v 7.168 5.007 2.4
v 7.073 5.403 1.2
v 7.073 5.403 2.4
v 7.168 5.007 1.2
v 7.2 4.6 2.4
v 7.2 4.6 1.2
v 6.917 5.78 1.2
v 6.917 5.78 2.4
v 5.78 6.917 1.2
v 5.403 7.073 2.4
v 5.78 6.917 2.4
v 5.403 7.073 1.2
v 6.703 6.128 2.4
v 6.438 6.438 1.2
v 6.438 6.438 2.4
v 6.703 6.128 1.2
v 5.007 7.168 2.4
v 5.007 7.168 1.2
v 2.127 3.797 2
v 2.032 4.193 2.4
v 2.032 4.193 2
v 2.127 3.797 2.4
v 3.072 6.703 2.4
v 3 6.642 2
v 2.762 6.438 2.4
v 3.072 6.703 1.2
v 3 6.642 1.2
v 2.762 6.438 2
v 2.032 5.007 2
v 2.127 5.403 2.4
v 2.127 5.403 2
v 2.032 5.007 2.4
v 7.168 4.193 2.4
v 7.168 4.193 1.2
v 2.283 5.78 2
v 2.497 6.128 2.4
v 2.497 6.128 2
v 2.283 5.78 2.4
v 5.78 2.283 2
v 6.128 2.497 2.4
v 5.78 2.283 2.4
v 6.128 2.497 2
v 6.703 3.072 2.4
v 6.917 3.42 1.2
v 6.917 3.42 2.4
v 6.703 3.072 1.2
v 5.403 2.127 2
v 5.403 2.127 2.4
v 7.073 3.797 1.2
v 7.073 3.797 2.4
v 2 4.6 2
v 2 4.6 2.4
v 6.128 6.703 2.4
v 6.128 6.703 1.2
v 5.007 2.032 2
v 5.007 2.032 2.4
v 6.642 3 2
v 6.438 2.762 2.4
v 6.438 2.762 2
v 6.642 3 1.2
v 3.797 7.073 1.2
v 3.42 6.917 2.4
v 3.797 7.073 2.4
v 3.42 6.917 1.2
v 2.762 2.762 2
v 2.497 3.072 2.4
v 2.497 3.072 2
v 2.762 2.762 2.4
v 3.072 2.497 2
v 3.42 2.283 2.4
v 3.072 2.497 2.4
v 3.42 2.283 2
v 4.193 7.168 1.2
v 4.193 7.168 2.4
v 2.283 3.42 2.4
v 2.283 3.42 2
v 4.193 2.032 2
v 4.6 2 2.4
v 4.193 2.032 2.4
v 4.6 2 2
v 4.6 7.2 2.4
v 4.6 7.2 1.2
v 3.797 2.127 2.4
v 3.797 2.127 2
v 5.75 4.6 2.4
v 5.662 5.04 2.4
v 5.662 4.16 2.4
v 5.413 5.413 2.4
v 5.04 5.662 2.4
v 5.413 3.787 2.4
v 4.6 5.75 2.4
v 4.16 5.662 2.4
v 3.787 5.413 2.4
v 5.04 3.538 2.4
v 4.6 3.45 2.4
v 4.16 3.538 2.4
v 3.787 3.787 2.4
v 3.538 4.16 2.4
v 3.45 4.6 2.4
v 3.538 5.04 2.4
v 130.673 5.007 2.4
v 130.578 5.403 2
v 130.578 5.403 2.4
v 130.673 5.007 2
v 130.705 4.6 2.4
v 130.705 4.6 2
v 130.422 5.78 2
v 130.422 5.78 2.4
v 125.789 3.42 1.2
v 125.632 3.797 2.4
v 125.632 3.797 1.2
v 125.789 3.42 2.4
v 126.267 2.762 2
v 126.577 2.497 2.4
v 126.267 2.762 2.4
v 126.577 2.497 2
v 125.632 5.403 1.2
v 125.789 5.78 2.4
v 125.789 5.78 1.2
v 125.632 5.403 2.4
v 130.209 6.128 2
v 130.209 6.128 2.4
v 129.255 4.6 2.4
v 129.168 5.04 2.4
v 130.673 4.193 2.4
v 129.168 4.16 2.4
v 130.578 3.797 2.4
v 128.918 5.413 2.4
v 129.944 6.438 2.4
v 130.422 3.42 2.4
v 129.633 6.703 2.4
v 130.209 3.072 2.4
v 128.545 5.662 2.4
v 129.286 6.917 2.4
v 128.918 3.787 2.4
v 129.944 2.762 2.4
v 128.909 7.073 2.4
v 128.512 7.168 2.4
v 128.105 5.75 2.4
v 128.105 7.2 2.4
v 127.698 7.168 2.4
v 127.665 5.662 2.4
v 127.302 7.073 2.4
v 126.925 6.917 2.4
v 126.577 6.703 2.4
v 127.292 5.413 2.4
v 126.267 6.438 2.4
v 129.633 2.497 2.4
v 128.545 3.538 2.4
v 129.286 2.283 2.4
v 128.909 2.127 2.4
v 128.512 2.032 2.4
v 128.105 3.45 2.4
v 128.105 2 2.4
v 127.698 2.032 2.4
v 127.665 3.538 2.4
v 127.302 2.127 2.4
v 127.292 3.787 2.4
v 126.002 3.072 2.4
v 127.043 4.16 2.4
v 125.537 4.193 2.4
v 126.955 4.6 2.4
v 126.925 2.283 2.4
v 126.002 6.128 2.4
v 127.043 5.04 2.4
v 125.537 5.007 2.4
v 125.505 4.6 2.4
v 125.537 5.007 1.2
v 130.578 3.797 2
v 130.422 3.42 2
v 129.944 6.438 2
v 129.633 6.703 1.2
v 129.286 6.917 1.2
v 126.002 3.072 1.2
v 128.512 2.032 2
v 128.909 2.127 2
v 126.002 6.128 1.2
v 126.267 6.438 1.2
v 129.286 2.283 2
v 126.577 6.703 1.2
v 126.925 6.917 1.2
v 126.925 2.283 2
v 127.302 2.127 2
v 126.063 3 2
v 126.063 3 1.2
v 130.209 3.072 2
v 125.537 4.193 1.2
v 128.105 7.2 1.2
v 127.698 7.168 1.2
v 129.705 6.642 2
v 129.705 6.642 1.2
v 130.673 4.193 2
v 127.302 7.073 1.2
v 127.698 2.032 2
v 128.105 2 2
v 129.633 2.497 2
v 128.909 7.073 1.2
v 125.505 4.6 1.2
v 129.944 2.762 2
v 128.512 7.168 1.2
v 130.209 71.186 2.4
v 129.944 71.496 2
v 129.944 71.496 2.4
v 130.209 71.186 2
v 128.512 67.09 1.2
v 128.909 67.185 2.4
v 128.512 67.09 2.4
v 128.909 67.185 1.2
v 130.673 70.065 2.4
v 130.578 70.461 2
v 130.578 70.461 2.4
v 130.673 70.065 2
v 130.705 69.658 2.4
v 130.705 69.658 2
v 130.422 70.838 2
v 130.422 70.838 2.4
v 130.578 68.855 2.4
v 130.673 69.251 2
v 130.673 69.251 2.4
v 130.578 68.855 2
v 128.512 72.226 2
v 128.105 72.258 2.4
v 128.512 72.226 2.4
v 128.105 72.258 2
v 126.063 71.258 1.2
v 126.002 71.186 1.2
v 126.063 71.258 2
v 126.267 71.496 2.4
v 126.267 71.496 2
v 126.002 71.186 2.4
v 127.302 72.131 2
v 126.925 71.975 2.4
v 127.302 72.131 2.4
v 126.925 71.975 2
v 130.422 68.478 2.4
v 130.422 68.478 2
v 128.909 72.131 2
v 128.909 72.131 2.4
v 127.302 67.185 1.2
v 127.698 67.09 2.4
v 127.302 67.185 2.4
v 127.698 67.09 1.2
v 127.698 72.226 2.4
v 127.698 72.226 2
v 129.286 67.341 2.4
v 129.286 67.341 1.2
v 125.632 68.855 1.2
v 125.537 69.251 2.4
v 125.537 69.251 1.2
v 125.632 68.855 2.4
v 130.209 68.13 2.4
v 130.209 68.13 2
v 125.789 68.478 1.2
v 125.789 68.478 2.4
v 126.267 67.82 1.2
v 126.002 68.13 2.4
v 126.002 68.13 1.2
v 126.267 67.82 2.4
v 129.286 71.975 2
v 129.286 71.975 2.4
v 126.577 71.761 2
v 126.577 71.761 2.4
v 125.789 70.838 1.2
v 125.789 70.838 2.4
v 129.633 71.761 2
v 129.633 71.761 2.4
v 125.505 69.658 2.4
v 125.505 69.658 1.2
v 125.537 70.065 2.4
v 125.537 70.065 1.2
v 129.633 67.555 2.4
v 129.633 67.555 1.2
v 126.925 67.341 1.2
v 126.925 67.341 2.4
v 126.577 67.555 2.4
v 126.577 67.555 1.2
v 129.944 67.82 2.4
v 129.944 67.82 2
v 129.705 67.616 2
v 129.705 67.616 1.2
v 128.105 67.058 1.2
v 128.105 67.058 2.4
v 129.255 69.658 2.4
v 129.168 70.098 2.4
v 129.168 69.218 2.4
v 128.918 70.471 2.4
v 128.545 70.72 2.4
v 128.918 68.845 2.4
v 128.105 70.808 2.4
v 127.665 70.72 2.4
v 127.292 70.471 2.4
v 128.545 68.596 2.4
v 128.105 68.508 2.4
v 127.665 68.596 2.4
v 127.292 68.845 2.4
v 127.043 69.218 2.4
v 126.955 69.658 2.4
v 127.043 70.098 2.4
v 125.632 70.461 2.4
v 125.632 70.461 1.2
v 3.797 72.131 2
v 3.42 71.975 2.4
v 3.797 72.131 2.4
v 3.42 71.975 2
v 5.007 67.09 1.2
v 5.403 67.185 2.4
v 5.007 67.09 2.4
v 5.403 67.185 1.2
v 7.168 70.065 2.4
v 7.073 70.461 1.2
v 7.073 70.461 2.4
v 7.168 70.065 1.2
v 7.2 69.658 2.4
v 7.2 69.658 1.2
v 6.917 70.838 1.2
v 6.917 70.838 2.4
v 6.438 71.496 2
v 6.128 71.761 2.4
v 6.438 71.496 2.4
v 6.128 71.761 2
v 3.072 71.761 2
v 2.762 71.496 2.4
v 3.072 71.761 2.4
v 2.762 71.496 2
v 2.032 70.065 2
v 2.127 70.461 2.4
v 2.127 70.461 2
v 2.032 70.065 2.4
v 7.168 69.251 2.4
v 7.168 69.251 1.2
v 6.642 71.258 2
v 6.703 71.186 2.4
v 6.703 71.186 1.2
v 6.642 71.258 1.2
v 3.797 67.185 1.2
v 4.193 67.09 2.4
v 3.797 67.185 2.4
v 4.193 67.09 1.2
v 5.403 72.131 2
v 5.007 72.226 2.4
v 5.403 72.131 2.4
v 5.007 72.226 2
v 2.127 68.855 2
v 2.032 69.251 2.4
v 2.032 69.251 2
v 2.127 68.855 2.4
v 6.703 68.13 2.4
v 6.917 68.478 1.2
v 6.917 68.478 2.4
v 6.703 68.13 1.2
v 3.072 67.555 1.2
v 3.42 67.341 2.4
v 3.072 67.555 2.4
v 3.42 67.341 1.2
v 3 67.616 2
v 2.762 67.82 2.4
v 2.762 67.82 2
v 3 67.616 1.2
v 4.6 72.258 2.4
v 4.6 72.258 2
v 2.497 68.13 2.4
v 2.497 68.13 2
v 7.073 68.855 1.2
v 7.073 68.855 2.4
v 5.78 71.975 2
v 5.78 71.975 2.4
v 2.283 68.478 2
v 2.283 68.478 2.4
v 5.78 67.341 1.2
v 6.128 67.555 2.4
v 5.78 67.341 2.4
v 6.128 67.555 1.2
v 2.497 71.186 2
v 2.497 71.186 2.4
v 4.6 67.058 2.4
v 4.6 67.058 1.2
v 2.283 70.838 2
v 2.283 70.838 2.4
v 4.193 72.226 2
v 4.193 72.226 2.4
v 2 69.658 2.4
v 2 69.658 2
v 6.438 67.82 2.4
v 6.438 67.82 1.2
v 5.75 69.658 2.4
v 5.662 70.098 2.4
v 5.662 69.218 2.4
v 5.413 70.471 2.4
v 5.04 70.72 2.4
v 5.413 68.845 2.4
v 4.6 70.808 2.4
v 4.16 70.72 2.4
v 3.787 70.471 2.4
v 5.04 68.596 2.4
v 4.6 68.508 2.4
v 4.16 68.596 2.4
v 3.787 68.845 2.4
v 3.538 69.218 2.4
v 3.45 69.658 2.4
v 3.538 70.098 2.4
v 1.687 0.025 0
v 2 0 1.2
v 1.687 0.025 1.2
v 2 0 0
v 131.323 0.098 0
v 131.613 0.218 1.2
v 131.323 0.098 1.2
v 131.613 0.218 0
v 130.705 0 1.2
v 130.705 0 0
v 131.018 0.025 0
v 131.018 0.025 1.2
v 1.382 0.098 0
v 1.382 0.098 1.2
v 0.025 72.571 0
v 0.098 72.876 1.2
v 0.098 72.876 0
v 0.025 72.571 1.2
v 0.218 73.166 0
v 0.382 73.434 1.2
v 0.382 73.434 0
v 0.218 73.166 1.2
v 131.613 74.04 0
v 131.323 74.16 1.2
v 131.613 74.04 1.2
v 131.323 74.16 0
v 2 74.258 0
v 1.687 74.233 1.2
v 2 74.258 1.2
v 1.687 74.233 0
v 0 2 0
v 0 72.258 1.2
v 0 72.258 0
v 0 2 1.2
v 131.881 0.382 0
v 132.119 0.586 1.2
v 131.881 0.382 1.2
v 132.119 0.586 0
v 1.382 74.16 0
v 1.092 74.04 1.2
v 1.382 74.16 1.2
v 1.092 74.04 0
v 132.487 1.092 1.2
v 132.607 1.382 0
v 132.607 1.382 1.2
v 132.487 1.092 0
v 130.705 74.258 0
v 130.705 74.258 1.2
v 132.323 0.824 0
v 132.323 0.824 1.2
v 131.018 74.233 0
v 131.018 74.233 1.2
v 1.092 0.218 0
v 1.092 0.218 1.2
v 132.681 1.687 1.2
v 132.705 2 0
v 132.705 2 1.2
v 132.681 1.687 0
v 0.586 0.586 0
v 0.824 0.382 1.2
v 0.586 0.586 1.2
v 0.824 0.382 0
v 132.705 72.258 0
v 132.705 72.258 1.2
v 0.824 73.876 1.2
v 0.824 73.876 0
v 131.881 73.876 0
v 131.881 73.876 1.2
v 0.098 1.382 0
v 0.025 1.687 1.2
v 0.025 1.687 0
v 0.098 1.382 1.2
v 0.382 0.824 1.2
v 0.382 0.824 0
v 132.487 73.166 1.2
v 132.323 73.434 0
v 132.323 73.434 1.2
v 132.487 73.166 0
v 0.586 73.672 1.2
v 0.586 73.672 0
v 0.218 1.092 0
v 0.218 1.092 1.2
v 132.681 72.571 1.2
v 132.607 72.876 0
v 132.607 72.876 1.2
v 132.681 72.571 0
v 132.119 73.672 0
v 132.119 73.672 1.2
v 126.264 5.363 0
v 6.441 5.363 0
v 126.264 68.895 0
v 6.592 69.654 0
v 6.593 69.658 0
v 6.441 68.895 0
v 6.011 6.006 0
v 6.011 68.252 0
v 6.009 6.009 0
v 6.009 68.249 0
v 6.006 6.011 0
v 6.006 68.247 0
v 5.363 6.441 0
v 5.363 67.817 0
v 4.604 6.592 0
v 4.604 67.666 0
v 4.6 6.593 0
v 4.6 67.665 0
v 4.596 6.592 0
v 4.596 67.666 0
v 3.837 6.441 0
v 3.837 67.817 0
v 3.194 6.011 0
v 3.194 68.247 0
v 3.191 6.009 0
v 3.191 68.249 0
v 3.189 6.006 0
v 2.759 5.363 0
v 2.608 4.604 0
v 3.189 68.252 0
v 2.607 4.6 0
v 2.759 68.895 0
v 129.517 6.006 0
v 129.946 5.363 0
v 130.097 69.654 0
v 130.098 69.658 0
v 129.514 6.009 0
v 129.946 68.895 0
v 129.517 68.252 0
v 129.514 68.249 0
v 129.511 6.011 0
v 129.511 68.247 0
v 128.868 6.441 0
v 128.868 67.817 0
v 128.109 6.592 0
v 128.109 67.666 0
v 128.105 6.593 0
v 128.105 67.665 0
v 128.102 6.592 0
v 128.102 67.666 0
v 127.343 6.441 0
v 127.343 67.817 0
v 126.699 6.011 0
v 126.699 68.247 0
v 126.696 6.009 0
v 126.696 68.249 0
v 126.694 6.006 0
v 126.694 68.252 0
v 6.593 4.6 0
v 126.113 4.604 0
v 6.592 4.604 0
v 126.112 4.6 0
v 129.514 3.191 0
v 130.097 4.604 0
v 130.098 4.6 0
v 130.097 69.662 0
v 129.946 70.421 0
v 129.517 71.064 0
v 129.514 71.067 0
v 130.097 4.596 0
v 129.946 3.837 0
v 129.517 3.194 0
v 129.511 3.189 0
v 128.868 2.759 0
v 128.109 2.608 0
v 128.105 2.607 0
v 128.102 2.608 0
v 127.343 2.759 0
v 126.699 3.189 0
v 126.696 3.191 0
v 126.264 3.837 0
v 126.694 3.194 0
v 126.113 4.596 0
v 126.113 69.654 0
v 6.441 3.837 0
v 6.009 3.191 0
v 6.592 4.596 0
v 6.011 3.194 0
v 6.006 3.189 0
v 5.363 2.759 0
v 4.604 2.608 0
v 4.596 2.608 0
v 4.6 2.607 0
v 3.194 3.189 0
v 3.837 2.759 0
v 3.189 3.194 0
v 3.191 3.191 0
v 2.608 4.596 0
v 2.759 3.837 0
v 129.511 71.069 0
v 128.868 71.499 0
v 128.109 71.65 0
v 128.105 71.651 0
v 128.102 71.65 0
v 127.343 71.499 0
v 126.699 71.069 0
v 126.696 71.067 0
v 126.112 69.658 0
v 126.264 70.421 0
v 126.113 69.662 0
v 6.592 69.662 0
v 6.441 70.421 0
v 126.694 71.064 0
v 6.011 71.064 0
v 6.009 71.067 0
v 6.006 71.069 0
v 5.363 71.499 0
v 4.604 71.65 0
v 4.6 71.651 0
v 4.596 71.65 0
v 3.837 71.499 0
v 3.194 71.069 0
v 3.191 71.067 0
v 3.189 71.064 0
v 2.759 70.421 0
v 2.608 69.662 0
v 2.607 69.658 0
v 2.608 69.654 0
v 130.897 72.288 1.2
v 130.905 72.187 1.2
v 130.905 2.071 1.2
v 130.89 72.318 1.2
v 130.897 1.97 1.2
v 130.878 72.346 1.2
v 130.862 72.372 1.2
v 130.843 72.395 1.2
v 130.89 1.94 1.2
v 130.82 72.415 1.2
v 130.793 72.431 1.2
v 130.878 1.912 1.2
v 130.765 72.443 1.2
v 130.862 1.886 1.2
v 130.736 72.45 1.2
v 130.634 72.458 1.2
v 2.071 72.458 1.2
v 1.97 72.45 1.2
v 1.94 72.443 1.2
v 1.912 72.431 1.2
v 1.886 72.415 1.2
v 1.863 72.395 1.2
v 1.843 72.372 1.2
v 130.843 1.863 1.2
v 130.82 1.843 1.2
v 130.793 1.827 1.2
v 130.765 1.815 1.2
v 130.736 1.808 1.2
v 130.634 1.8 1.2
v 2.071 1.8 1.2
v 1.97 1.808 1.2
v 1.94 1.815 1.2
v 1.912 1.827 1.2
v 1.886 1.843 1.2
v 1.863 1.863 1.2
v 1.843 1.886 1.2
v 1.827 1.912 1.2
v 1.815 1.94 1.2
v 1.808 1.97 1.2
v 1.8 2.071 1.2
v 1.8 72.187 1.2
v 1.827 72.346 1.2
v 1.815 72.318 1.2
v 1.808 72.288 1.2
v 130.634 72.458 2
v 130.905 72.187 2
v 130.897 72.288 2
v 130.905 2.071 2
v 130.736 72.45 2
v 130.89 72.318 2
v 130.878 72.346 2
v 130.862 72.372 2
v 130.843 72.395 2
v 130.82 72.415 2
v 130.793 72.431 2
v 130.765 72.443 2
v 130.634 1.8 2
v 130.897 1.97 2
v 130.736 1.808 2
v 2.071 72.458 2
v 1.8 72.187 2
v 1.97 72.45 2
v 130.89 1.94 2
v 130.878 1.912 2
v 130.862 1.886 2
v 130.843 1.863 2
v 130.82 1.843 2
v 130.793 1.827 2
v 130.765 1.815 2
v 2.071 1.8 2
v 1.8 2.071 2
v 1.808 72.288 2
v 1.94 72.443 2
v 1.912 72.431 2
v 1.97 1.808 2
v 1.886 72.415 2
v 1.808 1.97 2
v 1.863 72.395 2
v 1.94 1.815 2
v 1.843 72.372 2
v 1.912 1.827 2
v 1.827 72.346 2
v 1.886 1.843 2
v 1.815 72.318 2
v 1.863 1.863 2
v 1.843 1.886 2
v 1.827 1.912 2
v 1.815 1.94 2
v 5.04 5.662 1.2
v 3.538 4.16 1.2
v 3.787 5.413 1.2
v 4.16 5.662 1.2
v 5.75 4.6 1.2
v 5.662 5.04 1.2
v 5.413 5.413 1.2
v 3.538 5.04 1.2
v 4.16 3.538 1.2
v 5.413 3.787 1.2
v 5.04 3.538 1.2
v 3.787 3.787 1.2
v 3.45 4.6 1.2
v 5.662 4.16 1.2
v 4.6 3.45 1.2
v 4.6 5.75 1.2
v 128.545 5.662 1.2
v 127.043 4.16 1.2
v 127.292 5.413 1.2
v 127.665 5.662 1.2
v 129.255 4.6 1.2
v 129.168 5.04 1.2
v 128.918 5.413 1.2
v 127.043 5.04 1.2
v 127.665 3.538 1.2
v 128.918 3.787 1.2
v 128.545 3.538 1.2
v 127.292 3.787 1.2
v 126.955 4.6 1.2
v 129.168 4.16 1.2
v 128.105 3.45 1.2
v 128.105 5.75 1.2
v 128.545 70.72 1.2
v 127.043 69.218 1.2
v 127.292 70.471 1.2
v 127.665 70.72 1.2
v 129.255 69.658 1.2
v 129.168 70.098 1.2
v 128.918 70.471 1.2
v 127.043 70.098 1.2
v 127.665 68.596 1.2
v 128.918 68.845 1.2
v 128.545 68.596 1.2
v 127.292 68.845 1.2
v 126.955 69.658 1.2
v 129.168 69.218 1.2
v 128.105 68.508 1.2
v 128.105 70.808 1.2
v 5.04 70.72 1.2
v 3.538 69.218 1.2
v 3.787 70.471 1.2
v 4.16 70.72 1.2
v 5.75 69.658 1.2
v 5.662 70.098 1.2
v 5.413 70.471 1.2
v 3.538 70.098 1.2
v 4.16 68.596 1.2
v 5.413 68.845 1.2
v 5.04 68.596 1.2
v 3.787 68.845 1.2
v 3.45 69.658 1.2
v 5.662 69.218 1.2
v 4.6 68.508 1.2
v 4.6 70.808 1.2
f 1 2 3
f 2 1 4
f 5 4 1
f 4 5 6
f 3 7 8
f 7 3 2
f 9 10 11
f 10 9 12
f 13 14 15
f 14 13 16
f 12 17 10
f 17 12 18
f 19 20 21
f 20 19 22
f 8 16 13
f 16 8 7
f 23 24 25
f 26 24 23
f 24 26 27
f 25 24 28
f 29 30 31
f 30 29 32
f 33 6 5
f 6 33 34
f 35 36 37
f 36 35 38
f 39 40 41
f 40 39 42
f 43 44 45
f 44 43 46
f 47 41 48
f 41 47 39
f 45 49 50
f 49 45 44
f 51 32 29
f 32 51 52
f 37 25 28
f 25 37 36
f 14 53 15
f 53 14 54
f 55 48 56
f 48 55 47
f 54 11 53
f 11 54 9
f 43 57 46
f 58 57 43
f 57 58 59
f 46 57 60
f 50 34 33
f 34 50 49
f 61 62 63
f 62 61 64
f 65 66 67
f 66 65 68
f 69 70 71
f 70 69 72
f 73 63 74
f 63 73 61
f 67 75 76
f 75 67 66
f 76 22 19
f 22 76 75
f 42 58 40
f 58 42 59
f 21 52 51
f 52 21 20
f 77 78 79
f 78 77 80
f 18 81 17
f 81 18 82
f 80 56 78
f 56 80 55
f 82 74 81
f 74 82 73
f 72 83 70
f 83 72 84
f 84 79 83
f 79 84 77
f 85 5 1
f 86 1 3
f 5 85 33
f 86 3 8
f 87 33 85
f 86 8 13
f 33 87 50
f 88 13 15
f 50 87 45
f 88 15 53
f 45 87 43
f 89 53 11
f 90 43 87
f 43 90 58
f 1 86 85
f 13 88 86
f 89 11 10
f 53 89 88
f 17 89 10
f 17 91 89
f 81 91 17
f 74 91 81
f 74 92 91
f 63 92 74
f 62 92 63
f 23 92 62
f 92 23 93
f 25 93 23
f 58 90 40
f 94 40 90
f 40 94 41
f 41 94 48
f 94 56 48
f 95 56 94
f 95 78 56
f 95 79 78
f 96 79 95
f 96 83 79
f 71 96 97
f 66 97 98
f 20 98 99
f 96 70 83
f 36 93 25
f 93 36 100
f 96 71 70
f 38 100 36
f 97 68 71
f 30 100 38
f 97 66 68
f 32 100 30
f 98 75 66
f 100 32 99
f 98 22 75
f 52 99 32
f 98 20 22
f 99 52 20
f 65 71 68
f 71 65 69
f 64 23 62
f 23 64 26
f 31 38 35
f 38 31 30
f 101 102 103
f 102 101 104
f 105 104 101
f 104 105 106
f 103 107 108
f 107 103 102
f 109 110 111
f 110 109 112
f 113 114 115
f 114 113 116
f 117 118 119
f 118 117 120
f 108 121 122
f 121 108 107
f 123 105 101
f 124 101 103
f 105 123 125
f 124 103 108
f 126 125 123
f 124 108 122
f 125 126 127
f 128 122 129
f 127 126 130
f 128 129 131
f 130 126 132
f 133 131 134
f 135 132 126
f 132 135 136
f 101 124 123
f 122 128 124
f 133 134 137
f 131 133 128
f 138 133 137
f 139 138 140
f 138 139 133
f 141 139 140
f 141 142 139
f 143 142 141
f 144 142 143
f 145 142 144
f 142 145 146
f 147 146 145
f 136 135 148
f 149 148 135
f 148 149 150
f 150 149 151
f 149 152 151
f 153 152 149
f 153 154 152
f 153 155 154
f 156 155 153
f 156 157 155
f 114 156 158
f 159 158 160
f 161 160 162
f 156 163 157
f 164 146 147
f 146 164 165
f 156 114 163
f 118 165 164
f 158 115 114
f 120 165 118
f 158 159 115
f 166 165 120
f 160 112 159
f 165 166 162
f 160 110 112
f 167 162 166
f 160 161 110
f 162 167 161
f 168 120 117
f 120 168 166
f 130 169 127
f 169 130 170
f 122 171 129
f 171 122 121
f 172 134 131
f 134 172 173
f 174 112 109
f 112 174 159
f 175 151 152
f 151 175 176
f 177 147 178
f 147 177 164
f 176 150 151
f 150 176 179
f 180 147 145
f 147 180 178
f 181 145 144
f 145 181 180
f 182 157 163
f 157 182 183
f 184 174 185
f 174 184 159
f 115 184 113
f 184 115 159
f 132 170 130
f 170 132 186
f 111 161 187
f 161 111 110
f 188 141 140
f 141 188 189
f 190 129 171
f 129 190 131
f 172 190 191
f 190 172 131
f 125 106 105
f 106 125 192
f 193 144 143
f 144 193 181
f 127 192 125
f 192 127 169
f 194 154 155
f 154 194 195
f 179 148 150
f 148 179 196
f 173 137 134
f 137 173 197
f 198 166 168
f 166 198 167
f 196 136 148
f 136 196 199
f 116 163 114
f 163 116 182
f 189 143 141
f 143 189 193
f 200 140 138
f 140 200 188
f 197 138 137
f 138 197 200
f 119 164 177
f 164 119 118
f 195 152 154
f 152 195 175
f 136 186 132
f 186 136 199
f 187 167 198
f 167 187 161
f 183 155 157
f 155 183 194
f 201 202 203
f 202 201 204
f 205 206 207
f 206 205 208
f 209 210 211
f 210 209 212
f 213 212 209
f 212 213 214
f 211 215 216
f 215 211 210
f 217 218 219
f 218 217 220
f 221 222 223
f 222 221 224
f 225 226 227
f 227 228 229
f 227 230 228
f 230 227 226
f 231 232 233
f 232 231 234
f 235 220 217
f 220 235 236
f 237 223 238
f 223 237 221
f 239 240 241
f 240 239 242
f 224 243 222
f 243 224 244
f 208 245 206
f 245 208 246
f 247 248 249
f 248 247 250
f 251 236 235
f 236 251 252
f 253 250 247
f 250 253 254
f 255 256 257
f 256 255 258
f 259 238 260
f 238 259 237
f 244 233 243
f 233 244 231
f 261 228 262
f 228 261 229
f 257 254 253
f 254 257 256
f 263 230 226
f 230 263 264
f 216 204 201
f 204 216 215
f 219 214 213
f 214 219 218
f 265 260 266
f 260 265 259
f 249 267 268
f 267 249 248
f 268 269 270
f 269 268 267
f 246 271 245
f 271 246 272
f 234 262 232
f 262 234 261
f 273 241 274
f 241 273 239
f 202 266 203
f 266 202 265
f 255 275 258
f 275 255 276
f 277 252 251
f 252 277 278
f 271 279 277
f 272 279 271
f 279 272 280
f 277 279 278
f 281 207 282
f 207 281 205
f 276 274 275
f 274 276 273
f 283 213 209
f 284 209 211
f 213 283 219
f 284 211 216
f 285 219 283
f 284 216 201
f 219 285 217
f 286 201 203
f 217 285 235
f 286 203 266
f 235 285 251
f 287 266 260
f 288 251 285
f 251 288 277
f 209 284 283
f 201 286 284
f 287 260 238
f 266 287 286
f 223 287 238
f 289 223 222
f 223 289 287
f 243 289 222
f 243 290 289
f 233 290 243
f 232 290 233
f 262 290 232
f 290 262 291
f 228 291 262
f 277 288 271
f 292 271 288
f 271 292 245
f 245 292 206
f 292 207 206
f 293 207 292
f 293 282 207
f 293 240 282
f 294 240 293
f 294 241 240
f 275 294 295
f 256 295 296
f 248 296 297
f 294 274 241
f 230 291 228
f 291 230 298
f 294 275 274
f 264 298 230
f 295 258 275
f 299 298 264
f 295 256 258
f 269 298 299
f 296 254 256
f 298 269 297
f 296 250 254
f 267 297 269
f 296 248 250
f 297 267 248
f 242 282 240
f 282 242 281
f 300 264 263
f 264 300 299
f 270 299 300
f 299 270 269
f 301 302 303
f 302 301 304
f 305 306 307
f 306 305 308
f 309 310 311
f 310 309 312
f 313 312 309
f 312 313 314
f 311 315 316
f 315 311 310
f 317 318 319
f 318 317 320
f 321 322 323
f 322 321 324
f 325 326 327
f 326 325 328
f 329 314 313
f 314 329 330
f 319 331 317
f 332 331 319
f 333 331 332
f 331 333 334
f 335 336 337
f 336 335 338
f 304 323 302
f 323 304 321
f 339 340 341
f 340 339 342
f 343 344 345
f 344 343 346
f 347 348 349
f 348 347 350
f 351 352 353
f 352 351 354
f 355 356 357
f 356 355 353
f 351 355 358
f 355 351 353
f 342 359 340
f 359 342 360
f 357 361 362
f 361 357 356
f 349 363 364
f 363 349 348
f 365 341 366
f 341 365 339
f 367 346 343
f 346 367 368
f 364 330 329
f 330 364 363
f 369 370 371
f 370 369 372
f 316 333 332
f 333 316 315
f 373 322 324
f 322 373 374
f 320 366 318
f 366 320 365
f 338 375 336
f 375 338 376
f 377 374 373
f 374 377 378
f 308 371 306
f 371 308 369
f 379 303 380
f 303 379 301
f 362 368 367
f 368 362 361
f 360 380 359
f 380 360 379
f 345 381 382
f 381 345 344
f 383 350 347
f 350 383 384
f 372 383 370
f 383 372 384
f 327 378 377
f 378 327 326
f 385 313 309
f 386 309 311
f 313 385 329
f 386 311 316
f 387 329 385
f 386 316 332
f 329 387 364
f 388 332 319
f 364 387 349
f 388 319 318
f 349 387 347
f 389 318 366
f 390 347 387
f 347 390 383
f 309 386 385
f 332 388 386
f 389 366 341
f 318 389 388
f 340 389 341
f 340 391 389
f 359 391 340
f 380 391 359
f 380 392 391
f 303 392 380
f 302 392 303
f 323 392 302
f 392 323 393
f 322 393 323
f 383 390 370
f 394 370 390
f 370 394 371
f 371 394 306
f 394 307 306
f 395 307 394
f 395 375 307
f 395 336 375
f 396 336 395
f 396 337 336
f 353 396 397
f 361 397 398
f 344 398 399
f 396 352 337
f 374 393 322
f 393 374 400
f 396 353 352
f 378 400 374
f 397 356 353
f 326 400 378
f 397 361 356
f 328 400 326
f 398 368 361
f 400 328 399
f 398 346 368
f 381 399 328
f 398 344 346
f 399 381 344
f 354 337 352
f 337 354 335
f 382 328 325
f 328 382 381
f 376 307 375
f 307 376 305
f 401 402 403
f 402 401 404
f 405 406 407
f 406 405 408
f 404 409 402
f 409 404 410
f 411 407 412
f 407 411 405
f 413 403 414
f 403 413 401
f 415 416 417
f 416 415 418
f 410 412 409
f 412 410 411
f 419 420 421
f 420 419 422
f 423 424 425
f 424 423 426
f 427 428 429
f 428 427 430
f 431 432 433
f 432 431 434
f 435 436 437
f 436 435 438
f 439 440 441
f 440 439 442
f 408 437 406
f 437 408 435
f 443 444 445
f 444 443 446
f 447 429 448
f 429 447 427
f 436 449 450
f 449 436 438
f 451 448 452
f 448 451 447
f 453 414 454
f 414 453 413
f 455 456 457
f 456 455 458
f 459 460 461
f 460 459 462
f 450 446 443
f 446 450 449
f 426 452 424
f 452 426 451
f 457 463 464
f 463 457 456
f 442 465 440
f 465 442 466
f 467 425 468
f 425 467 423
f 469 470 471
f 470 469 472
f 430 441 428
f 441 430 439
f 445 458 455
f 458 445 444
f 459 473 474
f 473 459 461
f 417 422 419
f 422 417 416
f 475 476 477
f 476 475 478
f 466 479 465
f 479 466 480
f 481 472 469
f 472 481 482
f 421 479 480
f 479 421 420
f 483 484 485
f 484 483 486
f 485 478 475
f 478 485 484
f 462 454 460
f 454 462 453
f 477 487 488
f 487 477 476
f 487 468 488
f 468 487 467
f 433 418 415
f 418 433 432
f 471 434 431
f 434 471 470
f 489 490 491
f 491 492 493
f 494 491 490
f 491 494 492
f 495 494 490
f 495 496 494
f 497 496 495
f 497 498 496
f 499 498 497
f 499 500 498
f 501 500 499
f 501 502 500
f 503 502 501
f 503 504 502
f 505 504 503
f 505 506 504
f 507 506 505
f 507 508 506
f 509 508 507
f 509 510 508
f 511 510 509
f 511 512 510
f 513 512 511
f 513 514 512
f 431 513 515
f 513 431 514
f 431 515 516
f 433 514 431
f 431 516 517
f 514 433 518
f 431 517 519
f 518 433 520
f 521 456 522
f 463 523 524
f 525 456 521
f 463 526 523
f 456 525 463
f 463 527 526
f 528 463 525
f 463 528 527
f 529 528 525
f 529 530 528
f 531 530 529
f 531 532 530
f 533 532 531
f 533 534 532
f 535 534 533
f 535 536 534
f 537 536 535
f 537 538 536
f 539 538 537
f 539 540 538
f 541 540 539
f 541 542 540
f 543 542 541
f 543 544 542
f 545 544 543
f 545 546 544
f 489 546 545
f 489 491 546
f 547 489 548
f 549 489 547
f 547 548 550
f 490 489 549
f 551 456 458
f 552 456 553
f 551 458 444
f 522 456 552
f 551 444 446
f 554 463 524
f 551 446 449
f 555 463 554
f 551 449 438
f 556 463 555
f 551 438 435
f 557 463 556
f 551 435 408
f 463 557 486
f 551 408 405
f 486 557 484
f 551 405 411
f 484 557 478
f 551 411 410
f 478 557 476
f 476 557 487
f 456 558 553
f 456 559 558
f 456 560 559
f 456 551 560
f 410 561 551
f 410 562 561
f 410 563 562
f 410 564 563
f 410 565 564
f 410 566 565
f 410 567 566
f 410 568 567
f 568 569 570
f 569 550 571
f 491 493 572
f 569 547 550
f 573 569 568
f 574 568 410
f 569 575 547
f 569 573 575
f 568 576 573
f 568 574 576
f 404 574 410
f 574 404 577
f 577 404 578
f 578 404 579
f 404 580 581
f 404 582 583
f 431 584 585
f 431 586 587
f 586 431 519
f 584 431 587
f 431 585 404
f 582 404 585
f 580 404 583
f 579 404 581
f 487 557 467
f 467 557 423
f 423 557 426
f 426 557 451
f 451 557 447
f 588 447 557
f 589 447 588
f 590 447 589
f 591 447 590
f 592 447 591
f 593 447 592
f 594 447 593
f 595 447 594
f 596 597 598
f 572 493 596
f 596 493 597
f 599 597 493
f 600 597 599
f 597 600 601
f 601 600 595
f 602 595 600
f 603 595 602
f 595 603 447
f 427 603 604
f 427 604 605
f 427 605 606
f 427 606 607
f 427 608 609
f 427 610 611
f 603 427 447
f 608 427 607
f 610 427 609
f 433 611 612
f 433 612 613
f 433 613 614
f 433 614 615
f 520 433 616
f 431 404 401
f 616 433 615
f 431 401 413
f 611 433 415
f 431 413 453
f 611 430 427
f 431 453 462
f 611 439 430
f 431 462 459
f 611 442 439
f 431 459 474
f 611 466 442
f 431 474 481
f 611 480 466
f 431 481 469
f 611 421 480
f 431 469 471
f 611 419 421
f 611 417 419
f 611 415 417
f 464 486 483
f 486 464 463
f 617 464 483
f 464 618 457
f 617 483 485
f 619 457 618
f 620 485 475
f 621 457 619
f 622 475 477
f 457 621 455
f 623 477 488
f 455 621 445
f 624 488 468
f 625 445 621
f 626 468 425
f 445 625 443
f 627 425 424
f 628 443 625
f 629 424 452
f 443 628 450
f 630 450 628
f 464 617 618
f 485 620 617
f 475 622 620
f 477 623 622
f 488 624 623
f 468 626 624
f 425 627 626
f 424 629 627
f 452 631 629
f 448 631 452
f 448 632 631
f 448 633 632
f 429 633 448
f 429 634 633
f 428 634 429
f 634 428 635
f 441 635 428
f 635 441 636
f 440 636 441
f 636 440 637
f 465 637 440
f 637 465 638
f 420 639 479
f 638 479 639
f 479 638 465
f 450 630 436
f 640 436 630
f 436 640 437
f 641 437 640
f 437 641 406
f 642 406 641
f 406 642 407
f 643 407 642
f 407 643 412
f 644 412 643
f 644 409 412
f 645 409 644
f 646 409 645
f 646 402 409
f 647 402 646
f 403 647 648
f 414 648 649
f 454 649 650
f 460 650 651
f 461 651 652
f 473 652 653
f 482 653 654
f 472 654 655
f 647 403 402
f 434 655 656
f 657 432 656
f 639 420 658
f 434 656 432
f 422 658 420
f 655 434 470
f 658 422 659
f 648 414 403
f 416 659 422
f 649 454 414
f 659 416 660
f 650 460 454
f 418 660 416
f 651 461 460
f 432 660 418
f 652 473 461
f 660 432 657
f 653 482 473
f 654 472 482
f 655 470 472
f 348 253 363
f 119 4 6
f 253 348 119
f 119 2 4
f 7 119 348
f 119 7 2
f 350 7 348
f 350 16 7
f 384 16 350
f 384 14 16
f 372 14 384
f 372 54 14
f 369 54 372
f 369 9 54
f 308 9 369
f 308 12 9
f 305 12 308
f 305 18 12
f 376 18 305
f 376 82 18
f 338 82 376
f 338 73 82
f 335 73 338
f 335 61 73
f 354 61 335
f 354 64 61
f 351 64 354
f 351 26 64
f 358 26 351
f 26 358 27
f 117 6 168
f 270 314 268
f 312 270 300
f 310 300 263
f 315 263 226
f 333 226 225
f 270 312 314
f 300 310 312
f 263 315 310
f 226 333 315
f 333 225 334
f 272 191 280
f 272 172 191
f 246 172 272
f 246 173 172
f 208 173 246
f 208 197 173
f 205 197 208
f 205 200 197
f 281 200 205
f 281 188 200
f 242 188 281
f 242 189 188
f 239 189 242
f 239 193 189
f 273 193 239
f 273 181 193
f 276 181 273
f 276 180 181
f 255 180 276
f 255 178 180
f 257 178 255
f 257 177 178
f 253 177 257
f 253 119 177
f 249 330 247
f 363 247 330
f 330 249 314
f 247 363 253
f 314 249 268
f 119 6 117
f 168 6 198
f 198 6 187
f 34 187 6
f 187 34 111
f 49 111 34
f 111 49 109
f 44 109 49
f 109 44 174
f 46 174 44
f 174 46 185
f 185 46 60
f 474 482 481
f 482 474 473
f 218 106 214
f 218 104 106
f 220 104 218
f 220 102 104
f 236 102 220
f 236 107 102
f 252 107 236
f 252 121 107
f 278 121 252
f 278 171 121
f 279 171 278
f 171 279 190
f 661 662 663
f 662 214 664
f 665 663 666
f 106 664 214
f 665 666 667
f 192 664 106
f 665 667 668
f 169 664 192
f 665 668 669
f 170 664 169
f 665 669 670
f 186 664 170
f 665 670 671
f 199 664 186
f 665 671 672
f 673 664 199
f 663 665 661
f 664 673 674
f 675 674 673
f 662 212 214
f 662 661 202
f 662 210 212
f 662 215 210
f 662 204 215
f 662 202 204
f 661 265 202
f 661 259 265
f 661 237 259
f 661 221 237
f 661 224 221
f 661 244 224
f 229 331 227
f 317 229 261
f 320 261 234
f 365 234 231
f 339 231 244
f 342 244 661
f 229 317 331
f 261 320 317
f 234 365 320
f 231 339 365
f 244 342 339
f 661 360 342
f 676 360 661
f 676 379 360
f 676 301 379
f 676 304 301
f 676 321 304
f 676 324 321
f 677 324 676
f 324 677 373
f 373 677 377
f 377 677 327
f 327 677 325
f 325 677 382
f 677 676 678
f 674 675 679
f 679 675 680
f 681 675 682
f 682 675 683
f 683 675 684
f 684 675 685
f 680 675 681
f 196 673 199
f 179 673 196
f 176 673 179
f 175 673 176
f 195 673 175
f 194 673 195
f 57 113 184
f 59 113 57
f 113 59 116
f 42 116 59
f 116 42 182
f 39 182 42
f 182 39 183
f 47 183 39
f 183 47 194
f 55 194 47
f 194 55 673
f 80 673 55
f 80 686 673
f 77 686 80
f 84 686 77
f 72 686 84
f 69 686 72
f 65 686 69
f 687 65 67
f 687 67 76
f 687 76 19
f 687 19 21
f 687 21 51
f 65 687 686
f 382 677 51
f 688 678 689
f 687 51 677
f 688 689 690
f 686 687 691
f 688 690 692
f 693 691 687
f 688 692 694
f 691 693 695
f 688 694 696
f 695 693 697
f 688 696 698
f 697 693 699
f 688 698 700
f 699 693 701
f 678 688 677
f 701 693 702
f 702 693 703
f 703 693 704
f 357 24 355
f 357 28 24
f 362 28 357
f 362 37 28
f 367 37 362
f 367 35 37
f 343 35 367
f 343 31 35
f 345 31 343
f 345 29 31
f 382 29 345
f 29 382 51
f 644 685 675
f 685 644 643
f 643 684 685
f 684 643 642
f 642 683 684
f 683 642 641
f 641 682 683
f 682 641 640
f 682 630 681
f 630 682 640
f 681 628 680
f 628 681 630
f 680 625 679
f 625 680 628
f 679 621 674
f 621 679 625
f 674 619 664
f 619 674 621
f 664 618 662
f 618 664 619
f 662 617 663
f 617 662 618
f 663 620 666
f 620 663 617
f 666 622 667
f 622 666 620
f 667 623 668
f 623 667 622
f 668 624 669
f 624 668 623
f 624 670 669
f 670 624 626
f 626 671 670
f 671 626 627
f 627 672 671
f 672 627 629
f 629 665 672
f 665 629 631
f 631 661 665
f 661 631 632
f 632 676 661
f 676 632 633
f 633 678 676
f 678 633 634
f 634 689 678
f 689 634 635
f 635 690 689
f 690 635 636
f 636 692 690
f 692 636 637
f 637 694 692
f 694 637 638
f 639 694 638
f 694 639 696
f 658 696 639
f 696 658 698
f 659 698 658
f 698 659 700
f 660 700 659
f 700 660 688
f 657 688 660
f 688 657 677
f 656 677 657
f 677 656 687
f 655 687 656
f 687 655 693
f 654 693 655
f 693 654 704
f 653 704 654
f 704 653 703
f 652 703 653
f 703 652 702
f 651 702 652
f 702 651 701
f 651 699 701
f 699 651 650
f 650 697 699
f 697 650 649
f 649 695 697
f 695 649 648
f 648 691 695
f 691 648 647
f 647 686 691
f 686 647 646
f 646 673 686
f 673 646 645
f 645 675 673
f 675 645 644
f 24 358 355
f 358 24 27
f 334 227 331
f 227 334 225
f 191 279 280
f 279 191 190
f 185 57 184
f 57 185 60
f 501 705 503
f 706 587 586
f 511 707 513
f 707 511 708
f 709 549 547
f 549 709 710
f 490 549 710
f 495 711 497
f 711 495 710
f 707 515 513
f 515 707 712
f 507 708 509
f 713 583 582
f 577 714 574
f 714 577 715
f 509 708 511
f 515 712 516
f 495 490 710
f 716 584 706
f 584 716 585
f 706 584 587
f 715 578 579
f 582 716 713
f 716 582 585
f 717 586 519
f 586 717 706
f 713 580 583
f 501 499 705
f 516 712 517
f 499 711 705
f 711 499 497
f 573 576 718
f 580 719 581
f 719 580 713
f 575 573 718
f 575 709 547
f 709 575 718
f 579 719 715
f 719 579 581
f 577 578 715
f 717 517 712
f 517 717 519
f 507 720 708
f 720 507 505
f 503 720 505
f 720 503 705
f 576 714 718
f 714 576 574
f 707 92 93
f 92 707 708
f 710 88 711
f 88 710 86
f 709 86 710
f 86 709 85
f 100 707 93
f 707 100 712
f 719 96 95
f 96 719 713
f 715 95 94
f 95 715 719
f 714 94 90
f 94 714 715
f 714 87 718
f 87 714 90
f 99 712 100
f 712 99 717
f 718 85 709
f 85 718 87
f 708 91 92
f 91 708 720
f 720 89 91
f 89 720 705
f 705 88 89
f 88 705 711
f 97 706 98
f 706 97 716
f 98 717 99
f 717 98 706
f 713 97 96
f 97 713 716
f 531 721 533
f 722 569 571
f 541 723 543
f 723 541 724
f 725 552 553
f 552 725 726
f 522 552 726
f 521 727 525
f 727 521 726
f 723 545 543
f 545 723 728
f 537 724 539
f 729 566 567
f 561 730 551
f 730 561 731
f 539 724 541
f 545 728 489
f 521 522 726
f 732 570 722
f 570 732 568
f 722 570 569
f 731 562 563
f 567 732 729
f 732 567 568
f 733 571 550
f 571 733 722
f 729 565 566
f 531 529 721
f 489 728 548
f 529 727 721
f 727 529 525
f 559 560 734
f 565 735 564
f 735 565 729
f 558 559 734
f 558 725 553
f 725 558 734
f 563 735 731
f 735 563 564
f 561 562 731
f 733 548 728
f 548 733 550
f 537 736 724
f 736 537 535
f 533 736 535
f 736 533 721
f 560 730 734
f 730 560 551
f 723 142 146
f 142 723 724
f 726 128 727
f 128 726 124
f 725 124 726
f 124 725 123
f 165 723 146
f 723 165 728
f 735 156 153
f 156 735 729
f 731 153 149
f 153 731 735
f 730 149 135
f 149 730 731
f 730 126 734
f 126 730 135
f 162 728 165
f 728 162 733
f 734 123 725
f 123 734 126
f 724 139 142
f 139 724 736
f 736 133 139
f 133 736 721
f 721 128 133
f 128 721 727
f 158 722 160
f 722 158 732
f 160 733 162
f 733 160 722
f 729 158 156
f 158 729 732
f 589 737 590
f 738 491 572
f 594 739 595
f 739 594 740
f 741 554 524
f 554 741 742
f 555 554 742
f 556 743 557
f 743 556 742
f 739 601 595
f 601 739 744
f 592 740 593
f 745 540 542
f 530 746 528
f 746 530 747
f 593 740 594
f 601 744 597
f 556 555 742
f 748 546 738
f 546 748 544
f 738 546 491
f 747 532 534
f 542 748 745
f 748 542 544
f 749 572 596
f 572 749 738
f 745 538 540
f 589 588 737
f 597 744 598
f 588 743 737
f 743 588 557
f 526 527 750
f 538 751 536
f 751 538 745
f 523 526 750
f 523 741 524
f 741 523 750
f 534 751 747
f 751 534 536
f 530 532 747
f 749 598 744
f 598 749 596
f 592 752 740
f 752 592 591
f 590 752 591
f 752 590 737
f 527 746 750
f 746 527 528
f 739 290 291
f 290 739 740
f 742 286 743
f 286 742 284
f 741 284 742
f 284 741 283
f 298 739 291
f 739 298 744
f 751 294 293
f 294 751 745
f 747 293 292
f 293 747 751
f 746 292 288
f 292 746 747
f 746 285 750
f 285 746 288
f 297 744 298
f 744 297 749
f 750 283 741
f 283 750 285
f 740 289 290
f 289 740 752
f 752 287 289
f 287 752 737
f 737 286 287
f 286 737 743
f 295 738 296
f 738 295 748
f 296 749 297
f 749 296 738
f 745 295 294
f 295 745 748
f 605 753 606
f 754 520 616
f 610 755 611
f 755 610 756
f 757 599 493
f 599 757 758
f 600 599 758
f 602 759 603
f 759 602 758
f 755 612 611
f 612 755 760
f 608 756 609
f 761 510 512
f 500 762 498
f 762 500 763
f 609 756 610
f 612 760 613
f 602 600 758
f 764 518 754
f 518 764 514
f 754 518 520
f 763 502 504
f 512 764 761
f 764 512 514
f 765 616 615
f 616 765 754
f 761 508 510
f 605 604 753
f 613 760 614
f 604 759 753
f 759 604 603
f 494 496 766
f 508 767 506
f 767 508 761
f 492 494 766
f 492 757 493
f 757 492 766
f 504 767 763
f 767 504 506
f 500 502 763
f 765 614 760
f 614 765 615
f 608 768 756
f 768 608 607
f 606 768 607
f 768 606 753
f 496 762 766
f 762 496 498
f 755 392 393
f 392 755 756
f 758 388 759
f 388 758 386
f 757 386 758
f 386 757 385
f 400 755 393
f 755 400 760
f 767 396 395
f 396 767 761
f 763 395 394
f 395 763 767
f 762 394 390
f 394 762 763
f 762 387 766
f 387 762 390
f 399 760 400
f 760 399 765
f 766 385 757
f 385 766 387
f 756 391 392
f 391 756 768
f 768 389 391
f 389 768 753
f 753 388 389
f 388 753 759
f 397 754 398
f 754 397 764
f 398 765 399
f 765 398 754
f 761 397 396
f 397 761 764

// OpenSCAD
// file: params.scad
// params.scad: mechanical parameters of the printed housing of the portable unit and shared helper modules.
// DESIGN ONLY: not printed, not built. Positions, beam sizes and assumed component outlines are defined in
// layout_gen.scad; do not retype them here.
include <layout_gen.scad>

$fn  = 40;
fn_s = 16;                         // facets of screw holes
eps  = 0.01;

// ---- heights above the deck top (z = 0 of the "deck frame")
ped_h   = axis_h - cube / 2;       // cube pedestal
fence_h = 2.5;                     // corner fences above the pedestal (below the beams)
fence_arm = 2.5;                   // arm length of a corner fence
feat_h  = inner_h - 0.3;           // baffles and dump walls end 0.3 mm below the lid

// ---- board seats (panels, sensor boards, mirrors, shutter plate)
seat_bw   = 1.2;                   // back wall
seat_lip  = 1.2;                   // front and back lips at the two ends
seat_eng  = 1.5;                   // engagement of a lip over the end of a board
seat_scr  = 4.4;                   // extension of the screw end beyond the board
seat_hole_x = -0.6;                // screw hole behind the front face (keeps the clamp tab off the side wall)
seat_hole_y = 2.05;                // screw hole beyond the end of the board

// ---- lid and corners
corner_r  = 2.0;                   // outer corner radius (vertical edges)
lid_lip_t = 1.2;                   // locating lip of the lid, inside the walls
lid_lip_h = 0.8;
lid_lip_c = 0.2;                   // clearance between lip and wall
lid_pad   = 1.2;                   // pads of the lid on the screw bosses (countersinks)

// ---- clamps
tab_l = 9.0;  tab_t = 2.0;  tab_back = 2.3;   // clamp tab: length, thickness, hole to rear end
tab_w1 = 4.6; tab_w2 = 9.0;                    // narrow / wide tab
lc_w = 4.6;   lc_t = 3.0;                      // lens clamp: width, thickness (45 degree nose)
lc_nose = lens_post_off - 1.5;                 // hole to the lower edge of the nose

// ---- colors of the assembly (paper palette)
c_print = "#CFCECE";  c_dark = "#6F6F6F";  c_l1 = "#3775BA";  c_l2 = "#DAA87C";  c_beam = "#8BCF8B";
c_glass = "#B8C9E5";  c_ink = "#272727";

// ---- outline of the housing (rounded vertical edges), inset by i
module outline2d(i = 0) { offset(delta = -i) offset(r = corner_r) offset(delta = -corner_r) square([LX, WY]); }

// ---- beams in the deck frame: required envelopes (+ m on every diameter); up > 0 opens them to the top
module bdisc(x, y, d, hx) { translate([x, y, axis_h]) rotate(hx ? [0, 90, 0] : [90, 0, 0]) cylinder(d = d, h = 0.02, center = true); }
module beam_seg(b, m = 0, up = 0) {
  hx = abs(b[3] - b[0]) > abs(b[4] - b[1]);
  hull() for (u = [0, up]) translate([0, 0, u]) { bdisc(b[0], b[1], b[2] + m, hx); bdisc(b[3], b[4], b[5] + m, hx); }
}
// space behind the reflecting face of a fold mirror (a beam ends on the 45 degree face, not on a plane across it)
module mirror_cut() { for (s = SEATS) if (s[8] == 0) translate([s[0], s[1], 0]) rotate([0, 0, s[2]]) translate([-5, -8, -1]) cube([5, 16, 80]); }
module beams(m = 0, up = 0, kind = -1) {
  difference() { union() for (b = BEAMS) if (kind < 0 || b[6] == kind) beam_seg(b, m, up); mirror_cut(); }
}

// ---- insertion volumes of the components (deck frame): body + clearance g, open to the top
module cyl_pocket(d, len, top = true) {
  rotate([0, 90, 0]) cylinder(d = d, h = len, center = true);
  if (top) translate([-len / 2, -d / 2, 0]) cube([len, d, inner_h]);
}
module pockets(g = clr) {
  for (c = CUBES) translate([c[0] - cube / 2 - g, c[1] - cube / 2 - g, ped_h]) cube([cube + 2 * g, cube + 2 * g, inner_h]);
  for (s = SEATS) translate([s[0], s[1], 0]) rotate([0, 0, s[2]])
    translate([-s[4] - g, -s[3] / 2 - g, axis_h - s[5] / 2]) cube([s[4] + 2 * g, s[3] + 2 * g, inner_h]);
  for (l = LENSES) translate([l[0], l[1], axis_h]) cyl_pocket(l[2], l[3] + 2 * g);
  translate([las_x + las_l / 2, las_y, axis_h]) cyl_pocket(las_d, las_l + 2 * g);
  translate([las_x + las_l + las_pin_l / 2, las_y, axis_h]) cyl_pocket(las_pin_d + 0.6, las_pin_l + 2 * g);
}

// ---- space of the clamp tabs (deck frame): tab + g, open to the top; no chassis feature may stand in it
module tab_box(w, g) { translate([-tab_back - g, -w / 2 - g, 0]) cube([tab_l + 2 * g, w + 2 * g, inner_h]); }
module tab_zones(g = 0.2) {
  for (p = POSTS) translate([p[0], p[1], axis_h + p[3]]) rotate([0, 0, p[2]]) tab_box(p[4] == 2 ? tab_w2 : tab_w1, g);
  for (s = SEATS) if (s[6] != 0) translate([s[0], s[1], 0]) rotate([0, 0, s[2]])
    translate([seat_hole_x, sign(s[6]) * (s[3] / 2 + clr + seat_hole_y), axis_h + s[5] / 2])
      rotate([0, 0, -90 * sign(s[6])]) tab_box(abs(s[6]) == 2 ? tab_w2 : tab_w1, g);
}
// main file
// covers.scad: lid, base tray (board bay with the USB-C cut-out) and board spacer of the portable unit.
// DESIGN ONLY: not printed, not built.
// Print orientation: lid with its outer face on the bed (as modeled here, lip and pads up); base tray as modeled
// (floor on the bed); spacer standing. No overhang beyond the 45 degree countersinks, no bridge.
include <params.scad>

z_pcb = floor_t + pcb_pad;                 // underside of the board above the outer bottom
usb_cut_w = usb_w + 0.6;

module countersink_down() {                // countersink in the face z = 0, screw along +z
  translate([0, 0, -eps]) cylinder(d1 = scr_head_d + 0.2, d2 = scr_clear, h = scr_head_h + eps, $fn = fn_s);
  translate([0, 0, -1]) cylinder(d = scr_clear, h = 30, $fn = fn_s);
}

// lid, modeled upside down: outer face at z = 0
module lid() {
  difference() {
    union() {
      linear_extrude(lid_t) outline2d();
      translate([0, 0, lid_t - 0.1]) linear_extrude(lid_lip_h + 0.1)
        difference() { outline2d(wall + lid_lip_c); outline2d(wall + lid_lip_c + lid_lip_t); }
      for (b = BOSSES) translate([b[0], b[1], lid_t - 0.1]) cylinder(d = boss_d - 0.4, h = lid_pad + 0.1);   // pad on a screw boss (overlaps the lip)
    }
    for (b = BOSSES) translate([b[0], b[1], 0]) countersink_down();
  }
}

// base tray: floor, walls, pads under the board, USB-C cut-out in the +x end wall
module base_tray() {
  difference() {
    union() {
      linear_extrude(floor_t) outline2d();
      linear_extrude(tray_h) difference() { outline2d(); outline2d(wall); }
      for (b = BOSSES) translate([b[0], b[1], 0]) cylinder(d = boss_d + 1, h = z_pcb);
      for (p = [[LX / 4, WY / 2], [LX / 2, WY / 2], [3 * LX / 4, WY / 2]]) translate([p[0], p[1], 0]) cylinder(d = 5, h = z_pcb);
    }
    for (b = BOSSES) translate([b[0], b[1], 0]) countersink_down();
    translate([LX - wall - 1, WY / 2 - usb_cut_w / 2, z_pcb + pcb_t - 0.2]) cube([wall + 2, usb_cut_w, tray_h]);
  }
}

// spacer between the board and the underside of the deck, on each of the four base screws
module pcb_spacer() {
  difference() {
    cylinder(d = boss_d, h = tray_h - z_pcb - pcb_t);
    translate([0, 0, -1]) cylinder(d = scr_clear + 0.2, h = tray_h, $fn = fn_s);
  }
}

lid();
